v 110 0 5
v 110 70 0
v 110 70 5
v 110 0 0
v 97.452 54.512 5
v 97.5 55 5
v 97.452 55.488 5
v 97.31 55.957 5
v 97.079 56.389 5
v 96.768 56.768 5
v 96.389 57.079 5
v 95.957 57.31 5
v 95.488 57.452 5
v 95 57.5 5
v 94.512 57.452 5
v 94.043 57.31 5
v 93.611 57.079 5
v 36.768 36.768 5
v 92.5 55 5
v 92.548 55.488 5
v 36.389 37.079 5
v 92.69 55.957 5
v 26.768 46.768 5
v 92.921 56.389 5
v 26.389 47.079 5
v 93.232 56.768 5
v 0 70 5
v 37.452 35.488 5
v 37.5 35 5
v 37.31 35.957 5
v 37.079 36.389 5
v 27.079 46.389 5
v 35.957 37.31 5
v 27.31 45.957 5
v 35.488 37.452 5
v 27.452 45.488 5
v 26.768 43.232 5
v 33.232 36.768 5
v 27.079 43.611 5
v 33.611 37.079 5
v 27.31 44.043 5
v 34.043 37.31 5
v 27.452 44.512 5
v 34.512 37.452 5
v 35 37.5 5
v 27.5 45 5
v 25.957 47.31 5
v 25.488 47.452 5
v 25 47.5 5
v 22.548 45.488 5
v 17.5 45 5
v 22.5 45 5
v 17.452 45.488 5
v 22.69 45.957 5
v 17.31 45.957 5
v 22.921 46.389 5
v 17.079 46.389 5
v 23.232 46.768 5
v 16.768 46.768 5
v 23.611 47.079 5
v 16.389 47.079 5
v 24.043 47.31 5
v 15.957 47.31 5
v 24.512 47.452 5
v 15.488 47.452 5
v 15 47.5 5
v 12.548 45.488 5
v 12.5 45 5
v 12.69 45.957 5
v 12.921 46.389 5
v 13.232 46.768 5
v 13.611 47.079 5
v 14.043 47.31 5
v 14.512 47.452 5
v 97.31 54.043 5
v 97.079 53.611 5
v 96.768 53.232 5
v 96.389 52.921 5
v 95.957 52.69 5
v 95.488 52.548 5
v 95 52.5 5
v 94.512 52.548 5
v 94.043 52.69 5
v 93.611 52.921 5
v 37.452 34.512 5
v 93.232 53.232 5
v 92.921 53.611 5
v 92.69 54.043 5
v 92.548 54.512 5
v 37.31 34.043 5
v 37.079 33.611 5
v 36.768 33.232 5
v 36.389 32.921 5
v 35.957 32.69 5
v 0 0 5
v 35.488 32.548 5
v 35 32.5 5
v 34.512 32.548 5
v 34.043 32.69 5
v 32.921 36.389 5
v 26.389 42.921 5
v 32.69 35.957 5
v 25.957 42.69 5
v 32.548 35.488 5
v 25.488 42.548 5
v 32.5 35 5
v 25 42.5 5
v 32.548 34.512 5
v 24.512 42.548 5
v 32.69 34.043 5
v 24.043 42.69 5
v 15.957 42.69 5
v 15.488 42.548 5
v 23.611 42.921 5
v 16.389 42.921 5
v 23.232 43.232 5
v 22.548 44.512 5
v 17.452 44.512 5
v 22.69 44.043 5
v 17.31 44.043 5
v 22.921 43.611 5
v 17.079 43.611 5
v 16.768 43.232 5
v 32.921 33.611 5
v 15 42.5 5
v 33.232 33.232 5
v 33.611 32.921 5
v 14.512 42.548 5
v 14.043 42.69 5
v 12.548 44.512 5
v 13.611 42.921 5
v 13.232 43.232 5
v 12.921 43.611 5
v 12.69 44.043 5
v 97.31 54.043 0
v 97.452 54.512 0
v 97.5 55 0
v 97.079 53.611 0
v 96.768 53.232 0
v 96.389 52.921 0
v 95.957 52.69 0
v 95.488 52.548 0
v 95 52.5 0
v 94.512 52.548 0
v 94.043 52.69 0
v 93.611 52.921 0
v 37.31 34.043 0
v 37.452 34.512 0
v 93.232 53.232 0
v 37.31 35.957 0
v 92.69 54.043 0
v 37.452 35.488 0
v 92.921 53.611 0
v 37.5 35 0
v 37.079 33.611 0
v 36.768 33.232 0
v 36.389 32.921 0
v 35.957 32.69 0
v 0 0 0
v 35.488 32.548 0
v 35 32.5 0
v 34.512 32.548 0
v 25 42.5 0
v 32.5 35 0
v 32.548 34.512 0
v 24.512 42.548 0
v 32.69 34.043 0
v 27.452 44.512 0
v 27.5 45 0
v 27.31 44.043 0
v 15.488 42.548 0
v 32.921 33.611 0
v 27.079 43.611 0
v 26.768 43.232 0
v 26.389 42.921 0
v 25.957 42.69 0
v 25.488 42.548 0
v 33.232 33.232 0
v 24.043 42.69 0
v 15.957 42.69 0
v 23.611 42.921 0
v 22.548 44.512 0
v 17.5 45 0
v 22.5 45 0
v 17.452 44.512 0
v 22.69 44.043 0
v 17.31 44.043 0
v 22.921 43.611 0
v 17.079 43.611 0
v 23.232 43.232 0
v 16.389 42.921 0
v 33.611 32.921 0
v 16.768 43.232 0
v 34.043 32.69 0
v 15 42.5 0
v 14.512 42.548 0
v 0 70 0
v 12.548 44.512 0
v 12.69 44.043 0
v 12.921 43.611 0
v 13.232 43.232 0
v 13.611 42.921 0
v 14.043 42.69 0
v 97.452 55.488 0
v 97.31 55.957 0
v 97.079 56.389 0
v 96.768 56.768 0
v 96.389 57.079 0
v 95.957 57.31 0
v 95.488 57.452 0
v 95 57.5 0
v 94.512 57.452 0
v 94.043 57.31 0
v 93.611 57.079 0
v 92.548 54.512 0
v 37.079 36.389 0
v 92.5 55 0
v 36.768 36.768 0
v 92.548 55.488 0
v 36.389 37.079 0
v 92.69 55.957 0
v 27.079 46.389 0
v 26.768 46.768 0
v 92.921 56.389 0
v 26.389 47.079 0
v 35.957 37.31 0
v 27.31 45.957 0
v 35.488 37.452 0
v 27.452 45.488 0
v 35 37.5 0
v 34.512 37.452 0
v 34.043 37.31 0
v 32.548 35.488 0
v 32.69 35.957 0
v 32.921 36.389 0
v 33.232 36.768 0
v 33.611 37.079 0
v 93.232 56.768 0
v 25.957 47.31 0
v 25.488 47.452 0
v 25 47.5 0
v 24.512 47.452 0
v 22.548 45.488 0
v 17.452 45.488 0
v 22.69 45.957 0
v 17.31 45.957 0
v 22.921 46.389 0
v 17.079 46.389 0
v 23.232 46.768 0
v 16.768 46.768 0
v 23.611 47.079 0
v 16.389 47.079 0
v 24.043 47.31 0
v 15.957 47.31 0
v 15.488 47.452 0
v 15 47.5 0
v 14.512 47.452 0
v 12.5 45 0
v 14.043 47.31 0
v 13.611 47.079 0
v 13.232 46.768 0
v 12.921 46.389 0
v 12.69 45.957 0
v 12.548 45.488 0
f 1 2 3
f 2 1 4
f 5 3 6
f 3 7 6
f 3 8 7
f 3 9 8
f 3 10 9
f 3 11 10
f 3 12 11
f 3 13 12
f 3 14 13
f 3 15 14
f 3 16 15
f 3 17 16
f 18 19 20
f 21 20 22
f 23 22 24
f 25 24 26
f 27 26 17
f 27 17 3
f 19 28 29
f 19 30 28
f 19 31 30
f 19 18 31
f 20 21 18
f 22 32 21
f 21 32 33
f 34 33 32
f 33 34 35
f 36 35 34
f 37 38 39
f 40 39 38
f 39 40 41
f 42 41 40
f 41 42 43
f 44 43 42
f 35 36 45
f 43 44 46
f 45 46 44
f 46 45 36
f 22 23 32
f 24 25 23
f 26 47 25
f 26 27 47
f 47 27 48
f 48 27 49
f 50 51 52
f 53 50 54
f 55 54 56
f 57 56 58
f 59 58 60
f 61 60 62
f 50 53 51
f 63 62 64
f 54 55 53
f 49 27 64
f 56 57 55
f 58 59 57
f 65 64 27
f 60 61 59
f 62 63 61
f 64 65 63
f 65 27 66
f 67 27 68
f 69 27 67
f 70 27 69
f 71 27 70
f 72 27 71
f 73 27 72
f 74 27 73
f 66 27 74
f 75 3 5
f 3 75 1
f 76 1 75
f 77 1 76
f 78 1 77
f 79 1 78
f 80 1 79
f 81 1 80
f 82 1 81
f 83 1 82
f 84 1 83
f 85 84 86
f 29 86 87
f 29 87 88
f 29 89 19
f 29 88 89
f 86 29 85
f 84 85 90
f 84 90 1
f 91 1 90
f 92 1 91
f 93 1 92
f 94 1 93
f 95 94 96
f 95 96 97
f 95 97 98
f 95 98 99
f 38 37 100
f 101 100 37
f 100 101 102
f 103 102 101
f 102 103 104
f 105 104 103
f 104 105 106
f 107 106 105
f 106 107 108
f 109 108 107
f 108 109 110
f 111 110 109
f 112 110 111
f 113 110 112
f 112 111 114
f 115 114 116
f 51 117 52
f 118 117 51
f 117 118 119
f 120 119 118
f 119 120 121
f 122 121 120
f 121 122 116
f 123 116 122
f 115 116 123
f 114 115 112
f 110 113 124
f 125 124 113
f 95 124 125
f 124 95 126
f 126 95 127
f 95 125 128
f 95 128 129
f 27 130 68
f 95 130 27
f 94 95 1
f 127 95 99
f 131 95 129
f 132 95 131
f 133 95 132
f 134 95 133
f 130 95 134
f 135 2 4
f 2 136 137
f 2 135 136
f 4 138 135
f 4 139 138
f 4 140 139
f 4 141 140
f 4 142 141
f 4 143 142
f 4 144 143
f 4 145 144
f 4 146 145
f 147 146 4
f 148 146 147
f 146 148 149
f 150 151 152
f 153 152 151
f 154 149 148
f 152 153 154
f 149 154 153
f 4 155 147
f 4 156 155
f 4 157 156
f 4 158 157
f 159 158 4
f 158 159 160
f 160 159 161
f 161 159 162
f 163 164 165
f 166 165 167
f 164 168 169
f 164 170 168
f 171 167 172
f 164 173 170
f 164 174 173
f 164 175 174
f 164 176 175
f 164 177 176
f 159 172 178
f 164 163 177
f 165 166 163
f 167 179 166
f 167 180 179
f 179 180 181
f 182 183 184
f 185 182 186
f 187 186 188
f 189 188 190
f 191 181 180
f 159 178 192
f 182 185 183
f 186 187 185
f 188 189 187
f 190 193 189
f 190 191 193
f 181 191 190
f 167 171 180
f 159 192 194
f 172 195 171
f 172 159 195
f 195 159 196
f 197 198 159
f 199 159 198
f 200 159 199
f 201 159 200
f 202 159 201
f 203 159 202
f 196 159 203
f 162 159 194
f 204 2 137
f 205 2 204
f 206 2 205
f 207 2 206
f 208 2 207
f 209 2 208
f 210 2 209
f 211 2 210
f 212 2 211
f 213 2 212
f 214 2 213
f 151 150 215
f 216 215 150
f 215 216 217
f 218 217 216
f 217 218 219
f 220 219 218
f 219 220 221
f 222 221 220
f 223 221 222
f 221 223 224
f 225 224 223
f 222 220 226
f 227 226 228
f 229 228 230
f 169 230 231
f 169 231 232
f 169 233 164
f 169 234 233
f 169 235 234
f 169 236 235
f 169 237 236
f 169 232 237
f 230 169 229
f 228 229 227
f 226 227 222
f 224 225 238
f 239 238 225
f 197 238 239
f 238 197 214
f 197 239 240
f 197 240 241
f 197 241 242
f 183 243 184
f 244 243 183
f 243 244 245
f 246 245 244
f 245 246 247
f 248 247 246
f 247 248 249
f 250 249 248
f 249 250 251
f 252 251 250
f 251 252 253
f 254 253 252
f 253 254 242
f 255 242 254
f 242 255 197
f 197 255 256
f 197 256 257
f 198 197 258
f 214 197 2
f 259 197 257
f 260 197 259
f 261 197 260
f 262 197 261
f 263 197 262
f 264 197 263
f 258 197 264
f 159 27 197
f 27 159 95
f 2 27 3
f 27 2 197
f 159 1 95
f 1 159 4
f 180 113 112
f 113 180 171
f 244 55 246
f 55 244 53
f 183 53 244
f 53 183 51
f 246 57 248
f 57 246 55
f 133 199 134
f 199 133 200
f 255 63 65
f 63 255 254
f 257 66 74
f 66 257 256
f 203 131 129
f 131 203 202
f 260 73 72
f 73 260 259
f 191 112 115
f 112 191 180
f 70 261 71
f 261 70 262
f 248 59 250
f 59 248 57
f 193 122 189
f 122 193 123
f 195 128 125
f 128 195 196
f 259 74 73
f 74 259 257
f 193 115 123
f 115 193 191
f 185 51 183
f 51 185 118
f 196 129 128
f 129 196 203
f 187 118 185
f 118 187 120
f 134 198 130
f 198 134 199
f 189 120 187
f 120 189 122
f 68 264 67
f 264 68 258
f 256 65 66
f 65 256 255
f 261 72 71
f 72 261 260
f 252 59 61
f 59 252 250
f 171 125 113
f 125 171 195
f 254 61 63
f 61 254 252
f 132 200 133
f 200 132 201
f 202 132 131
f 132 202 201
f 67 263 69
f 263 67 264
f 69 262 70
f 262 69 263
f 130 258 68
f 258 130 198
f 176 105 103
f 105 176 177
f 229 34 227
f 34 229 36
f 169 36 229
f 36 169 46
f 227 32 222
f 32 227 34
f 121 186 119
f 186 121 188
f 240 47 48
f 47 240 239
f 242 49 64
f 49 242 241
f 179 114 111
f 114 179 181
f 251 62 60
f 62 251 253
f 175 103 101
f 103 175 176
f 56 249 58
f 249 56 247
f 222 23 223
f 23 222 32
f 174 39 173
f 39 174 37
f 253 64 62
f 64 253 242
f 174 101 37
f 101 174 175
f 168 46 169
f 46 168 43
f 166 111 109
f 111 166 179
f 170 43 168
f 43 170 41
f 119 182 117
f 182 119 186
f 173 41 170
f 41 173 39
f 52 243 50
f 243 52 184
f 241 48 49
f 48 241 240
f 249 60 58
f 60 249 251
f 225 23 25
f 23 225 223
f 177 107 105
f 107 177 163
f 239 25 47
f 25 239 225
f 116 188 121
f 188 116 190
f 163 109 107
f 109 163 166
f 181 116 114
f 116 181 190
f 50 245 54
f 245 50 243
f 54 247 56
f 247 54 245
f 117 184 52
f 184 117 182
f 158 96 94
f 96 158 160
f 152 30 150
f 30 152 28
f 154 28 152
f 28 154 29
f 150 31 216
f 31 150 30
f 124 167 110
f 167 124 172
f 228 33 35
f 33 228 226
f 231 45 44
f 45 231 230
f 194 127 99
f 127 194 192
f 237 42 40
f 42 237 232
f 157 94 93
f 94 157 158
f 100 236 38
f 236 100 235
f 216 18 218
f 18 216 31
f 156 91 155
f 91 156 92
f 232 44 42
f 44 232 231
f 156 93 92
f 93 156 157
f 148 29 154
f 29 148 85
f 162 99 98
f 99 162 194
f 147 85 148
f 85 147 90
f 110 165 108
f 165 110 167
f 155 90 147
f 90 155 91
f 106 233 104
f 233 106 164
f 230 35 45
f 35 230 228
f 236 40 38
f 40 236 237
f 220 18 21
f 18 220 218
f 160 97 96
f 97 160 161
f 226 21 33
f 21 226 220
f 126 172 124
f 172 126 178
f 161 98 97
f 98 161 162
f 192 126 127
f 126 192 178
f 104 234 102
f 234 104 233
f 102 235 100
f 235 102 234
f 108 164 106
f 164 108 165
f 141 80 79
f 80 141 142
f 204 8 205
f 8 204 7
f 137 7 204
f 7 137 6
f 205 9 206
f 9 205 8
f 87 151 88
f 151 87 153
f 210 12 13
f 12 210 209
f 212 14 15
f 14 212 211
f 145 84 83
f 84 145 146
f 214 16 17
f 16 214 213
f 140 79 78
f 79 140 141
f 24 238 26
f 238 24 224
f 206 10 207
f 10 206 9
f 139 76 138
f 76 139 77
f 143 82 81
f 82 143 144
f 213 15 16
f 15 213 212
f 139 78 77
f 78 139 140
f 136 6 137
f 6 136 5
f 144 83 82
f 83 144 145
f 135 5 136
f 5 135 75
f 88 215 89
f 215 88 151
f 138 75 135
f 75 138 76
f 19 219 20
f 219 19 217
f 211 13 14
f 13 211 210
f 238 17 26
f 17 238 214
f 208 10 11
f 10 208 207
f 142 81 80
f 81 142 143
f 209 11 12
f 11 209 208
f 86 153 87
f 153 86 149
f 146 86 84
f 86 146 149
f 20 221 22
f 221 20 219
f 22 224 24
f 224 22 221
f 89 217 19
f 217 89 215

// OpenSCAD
$fn = 32;

// ----------------------------------------------------------------------
// Hole field: plate with holes at given coordinates
// ----------------------------------------------------------------------

// --- parameters (mm) ---
plate_l = 110;            // plate length, X
plate_w = 70;             // plate width, Y
plate_t = 5;              // plate thickness, Z
hole_d = 5;               // hole diameter

difference() {
  cube([plate_l, plate_w, plate_t]);
  translate([15, 45, -1]) cylinder(h = plate_t + 2, d = hole_d);
  translate([25, 45, -1]) cylinder(h = plate_t + 2, d = hole_d);
  translate([35, 35, -1]) cylinder(h = plate_t + 2, d = hole_d);
  translate([95, 55, -1]) cylinder(h = plate_t + 2, d = hole_d);
}
